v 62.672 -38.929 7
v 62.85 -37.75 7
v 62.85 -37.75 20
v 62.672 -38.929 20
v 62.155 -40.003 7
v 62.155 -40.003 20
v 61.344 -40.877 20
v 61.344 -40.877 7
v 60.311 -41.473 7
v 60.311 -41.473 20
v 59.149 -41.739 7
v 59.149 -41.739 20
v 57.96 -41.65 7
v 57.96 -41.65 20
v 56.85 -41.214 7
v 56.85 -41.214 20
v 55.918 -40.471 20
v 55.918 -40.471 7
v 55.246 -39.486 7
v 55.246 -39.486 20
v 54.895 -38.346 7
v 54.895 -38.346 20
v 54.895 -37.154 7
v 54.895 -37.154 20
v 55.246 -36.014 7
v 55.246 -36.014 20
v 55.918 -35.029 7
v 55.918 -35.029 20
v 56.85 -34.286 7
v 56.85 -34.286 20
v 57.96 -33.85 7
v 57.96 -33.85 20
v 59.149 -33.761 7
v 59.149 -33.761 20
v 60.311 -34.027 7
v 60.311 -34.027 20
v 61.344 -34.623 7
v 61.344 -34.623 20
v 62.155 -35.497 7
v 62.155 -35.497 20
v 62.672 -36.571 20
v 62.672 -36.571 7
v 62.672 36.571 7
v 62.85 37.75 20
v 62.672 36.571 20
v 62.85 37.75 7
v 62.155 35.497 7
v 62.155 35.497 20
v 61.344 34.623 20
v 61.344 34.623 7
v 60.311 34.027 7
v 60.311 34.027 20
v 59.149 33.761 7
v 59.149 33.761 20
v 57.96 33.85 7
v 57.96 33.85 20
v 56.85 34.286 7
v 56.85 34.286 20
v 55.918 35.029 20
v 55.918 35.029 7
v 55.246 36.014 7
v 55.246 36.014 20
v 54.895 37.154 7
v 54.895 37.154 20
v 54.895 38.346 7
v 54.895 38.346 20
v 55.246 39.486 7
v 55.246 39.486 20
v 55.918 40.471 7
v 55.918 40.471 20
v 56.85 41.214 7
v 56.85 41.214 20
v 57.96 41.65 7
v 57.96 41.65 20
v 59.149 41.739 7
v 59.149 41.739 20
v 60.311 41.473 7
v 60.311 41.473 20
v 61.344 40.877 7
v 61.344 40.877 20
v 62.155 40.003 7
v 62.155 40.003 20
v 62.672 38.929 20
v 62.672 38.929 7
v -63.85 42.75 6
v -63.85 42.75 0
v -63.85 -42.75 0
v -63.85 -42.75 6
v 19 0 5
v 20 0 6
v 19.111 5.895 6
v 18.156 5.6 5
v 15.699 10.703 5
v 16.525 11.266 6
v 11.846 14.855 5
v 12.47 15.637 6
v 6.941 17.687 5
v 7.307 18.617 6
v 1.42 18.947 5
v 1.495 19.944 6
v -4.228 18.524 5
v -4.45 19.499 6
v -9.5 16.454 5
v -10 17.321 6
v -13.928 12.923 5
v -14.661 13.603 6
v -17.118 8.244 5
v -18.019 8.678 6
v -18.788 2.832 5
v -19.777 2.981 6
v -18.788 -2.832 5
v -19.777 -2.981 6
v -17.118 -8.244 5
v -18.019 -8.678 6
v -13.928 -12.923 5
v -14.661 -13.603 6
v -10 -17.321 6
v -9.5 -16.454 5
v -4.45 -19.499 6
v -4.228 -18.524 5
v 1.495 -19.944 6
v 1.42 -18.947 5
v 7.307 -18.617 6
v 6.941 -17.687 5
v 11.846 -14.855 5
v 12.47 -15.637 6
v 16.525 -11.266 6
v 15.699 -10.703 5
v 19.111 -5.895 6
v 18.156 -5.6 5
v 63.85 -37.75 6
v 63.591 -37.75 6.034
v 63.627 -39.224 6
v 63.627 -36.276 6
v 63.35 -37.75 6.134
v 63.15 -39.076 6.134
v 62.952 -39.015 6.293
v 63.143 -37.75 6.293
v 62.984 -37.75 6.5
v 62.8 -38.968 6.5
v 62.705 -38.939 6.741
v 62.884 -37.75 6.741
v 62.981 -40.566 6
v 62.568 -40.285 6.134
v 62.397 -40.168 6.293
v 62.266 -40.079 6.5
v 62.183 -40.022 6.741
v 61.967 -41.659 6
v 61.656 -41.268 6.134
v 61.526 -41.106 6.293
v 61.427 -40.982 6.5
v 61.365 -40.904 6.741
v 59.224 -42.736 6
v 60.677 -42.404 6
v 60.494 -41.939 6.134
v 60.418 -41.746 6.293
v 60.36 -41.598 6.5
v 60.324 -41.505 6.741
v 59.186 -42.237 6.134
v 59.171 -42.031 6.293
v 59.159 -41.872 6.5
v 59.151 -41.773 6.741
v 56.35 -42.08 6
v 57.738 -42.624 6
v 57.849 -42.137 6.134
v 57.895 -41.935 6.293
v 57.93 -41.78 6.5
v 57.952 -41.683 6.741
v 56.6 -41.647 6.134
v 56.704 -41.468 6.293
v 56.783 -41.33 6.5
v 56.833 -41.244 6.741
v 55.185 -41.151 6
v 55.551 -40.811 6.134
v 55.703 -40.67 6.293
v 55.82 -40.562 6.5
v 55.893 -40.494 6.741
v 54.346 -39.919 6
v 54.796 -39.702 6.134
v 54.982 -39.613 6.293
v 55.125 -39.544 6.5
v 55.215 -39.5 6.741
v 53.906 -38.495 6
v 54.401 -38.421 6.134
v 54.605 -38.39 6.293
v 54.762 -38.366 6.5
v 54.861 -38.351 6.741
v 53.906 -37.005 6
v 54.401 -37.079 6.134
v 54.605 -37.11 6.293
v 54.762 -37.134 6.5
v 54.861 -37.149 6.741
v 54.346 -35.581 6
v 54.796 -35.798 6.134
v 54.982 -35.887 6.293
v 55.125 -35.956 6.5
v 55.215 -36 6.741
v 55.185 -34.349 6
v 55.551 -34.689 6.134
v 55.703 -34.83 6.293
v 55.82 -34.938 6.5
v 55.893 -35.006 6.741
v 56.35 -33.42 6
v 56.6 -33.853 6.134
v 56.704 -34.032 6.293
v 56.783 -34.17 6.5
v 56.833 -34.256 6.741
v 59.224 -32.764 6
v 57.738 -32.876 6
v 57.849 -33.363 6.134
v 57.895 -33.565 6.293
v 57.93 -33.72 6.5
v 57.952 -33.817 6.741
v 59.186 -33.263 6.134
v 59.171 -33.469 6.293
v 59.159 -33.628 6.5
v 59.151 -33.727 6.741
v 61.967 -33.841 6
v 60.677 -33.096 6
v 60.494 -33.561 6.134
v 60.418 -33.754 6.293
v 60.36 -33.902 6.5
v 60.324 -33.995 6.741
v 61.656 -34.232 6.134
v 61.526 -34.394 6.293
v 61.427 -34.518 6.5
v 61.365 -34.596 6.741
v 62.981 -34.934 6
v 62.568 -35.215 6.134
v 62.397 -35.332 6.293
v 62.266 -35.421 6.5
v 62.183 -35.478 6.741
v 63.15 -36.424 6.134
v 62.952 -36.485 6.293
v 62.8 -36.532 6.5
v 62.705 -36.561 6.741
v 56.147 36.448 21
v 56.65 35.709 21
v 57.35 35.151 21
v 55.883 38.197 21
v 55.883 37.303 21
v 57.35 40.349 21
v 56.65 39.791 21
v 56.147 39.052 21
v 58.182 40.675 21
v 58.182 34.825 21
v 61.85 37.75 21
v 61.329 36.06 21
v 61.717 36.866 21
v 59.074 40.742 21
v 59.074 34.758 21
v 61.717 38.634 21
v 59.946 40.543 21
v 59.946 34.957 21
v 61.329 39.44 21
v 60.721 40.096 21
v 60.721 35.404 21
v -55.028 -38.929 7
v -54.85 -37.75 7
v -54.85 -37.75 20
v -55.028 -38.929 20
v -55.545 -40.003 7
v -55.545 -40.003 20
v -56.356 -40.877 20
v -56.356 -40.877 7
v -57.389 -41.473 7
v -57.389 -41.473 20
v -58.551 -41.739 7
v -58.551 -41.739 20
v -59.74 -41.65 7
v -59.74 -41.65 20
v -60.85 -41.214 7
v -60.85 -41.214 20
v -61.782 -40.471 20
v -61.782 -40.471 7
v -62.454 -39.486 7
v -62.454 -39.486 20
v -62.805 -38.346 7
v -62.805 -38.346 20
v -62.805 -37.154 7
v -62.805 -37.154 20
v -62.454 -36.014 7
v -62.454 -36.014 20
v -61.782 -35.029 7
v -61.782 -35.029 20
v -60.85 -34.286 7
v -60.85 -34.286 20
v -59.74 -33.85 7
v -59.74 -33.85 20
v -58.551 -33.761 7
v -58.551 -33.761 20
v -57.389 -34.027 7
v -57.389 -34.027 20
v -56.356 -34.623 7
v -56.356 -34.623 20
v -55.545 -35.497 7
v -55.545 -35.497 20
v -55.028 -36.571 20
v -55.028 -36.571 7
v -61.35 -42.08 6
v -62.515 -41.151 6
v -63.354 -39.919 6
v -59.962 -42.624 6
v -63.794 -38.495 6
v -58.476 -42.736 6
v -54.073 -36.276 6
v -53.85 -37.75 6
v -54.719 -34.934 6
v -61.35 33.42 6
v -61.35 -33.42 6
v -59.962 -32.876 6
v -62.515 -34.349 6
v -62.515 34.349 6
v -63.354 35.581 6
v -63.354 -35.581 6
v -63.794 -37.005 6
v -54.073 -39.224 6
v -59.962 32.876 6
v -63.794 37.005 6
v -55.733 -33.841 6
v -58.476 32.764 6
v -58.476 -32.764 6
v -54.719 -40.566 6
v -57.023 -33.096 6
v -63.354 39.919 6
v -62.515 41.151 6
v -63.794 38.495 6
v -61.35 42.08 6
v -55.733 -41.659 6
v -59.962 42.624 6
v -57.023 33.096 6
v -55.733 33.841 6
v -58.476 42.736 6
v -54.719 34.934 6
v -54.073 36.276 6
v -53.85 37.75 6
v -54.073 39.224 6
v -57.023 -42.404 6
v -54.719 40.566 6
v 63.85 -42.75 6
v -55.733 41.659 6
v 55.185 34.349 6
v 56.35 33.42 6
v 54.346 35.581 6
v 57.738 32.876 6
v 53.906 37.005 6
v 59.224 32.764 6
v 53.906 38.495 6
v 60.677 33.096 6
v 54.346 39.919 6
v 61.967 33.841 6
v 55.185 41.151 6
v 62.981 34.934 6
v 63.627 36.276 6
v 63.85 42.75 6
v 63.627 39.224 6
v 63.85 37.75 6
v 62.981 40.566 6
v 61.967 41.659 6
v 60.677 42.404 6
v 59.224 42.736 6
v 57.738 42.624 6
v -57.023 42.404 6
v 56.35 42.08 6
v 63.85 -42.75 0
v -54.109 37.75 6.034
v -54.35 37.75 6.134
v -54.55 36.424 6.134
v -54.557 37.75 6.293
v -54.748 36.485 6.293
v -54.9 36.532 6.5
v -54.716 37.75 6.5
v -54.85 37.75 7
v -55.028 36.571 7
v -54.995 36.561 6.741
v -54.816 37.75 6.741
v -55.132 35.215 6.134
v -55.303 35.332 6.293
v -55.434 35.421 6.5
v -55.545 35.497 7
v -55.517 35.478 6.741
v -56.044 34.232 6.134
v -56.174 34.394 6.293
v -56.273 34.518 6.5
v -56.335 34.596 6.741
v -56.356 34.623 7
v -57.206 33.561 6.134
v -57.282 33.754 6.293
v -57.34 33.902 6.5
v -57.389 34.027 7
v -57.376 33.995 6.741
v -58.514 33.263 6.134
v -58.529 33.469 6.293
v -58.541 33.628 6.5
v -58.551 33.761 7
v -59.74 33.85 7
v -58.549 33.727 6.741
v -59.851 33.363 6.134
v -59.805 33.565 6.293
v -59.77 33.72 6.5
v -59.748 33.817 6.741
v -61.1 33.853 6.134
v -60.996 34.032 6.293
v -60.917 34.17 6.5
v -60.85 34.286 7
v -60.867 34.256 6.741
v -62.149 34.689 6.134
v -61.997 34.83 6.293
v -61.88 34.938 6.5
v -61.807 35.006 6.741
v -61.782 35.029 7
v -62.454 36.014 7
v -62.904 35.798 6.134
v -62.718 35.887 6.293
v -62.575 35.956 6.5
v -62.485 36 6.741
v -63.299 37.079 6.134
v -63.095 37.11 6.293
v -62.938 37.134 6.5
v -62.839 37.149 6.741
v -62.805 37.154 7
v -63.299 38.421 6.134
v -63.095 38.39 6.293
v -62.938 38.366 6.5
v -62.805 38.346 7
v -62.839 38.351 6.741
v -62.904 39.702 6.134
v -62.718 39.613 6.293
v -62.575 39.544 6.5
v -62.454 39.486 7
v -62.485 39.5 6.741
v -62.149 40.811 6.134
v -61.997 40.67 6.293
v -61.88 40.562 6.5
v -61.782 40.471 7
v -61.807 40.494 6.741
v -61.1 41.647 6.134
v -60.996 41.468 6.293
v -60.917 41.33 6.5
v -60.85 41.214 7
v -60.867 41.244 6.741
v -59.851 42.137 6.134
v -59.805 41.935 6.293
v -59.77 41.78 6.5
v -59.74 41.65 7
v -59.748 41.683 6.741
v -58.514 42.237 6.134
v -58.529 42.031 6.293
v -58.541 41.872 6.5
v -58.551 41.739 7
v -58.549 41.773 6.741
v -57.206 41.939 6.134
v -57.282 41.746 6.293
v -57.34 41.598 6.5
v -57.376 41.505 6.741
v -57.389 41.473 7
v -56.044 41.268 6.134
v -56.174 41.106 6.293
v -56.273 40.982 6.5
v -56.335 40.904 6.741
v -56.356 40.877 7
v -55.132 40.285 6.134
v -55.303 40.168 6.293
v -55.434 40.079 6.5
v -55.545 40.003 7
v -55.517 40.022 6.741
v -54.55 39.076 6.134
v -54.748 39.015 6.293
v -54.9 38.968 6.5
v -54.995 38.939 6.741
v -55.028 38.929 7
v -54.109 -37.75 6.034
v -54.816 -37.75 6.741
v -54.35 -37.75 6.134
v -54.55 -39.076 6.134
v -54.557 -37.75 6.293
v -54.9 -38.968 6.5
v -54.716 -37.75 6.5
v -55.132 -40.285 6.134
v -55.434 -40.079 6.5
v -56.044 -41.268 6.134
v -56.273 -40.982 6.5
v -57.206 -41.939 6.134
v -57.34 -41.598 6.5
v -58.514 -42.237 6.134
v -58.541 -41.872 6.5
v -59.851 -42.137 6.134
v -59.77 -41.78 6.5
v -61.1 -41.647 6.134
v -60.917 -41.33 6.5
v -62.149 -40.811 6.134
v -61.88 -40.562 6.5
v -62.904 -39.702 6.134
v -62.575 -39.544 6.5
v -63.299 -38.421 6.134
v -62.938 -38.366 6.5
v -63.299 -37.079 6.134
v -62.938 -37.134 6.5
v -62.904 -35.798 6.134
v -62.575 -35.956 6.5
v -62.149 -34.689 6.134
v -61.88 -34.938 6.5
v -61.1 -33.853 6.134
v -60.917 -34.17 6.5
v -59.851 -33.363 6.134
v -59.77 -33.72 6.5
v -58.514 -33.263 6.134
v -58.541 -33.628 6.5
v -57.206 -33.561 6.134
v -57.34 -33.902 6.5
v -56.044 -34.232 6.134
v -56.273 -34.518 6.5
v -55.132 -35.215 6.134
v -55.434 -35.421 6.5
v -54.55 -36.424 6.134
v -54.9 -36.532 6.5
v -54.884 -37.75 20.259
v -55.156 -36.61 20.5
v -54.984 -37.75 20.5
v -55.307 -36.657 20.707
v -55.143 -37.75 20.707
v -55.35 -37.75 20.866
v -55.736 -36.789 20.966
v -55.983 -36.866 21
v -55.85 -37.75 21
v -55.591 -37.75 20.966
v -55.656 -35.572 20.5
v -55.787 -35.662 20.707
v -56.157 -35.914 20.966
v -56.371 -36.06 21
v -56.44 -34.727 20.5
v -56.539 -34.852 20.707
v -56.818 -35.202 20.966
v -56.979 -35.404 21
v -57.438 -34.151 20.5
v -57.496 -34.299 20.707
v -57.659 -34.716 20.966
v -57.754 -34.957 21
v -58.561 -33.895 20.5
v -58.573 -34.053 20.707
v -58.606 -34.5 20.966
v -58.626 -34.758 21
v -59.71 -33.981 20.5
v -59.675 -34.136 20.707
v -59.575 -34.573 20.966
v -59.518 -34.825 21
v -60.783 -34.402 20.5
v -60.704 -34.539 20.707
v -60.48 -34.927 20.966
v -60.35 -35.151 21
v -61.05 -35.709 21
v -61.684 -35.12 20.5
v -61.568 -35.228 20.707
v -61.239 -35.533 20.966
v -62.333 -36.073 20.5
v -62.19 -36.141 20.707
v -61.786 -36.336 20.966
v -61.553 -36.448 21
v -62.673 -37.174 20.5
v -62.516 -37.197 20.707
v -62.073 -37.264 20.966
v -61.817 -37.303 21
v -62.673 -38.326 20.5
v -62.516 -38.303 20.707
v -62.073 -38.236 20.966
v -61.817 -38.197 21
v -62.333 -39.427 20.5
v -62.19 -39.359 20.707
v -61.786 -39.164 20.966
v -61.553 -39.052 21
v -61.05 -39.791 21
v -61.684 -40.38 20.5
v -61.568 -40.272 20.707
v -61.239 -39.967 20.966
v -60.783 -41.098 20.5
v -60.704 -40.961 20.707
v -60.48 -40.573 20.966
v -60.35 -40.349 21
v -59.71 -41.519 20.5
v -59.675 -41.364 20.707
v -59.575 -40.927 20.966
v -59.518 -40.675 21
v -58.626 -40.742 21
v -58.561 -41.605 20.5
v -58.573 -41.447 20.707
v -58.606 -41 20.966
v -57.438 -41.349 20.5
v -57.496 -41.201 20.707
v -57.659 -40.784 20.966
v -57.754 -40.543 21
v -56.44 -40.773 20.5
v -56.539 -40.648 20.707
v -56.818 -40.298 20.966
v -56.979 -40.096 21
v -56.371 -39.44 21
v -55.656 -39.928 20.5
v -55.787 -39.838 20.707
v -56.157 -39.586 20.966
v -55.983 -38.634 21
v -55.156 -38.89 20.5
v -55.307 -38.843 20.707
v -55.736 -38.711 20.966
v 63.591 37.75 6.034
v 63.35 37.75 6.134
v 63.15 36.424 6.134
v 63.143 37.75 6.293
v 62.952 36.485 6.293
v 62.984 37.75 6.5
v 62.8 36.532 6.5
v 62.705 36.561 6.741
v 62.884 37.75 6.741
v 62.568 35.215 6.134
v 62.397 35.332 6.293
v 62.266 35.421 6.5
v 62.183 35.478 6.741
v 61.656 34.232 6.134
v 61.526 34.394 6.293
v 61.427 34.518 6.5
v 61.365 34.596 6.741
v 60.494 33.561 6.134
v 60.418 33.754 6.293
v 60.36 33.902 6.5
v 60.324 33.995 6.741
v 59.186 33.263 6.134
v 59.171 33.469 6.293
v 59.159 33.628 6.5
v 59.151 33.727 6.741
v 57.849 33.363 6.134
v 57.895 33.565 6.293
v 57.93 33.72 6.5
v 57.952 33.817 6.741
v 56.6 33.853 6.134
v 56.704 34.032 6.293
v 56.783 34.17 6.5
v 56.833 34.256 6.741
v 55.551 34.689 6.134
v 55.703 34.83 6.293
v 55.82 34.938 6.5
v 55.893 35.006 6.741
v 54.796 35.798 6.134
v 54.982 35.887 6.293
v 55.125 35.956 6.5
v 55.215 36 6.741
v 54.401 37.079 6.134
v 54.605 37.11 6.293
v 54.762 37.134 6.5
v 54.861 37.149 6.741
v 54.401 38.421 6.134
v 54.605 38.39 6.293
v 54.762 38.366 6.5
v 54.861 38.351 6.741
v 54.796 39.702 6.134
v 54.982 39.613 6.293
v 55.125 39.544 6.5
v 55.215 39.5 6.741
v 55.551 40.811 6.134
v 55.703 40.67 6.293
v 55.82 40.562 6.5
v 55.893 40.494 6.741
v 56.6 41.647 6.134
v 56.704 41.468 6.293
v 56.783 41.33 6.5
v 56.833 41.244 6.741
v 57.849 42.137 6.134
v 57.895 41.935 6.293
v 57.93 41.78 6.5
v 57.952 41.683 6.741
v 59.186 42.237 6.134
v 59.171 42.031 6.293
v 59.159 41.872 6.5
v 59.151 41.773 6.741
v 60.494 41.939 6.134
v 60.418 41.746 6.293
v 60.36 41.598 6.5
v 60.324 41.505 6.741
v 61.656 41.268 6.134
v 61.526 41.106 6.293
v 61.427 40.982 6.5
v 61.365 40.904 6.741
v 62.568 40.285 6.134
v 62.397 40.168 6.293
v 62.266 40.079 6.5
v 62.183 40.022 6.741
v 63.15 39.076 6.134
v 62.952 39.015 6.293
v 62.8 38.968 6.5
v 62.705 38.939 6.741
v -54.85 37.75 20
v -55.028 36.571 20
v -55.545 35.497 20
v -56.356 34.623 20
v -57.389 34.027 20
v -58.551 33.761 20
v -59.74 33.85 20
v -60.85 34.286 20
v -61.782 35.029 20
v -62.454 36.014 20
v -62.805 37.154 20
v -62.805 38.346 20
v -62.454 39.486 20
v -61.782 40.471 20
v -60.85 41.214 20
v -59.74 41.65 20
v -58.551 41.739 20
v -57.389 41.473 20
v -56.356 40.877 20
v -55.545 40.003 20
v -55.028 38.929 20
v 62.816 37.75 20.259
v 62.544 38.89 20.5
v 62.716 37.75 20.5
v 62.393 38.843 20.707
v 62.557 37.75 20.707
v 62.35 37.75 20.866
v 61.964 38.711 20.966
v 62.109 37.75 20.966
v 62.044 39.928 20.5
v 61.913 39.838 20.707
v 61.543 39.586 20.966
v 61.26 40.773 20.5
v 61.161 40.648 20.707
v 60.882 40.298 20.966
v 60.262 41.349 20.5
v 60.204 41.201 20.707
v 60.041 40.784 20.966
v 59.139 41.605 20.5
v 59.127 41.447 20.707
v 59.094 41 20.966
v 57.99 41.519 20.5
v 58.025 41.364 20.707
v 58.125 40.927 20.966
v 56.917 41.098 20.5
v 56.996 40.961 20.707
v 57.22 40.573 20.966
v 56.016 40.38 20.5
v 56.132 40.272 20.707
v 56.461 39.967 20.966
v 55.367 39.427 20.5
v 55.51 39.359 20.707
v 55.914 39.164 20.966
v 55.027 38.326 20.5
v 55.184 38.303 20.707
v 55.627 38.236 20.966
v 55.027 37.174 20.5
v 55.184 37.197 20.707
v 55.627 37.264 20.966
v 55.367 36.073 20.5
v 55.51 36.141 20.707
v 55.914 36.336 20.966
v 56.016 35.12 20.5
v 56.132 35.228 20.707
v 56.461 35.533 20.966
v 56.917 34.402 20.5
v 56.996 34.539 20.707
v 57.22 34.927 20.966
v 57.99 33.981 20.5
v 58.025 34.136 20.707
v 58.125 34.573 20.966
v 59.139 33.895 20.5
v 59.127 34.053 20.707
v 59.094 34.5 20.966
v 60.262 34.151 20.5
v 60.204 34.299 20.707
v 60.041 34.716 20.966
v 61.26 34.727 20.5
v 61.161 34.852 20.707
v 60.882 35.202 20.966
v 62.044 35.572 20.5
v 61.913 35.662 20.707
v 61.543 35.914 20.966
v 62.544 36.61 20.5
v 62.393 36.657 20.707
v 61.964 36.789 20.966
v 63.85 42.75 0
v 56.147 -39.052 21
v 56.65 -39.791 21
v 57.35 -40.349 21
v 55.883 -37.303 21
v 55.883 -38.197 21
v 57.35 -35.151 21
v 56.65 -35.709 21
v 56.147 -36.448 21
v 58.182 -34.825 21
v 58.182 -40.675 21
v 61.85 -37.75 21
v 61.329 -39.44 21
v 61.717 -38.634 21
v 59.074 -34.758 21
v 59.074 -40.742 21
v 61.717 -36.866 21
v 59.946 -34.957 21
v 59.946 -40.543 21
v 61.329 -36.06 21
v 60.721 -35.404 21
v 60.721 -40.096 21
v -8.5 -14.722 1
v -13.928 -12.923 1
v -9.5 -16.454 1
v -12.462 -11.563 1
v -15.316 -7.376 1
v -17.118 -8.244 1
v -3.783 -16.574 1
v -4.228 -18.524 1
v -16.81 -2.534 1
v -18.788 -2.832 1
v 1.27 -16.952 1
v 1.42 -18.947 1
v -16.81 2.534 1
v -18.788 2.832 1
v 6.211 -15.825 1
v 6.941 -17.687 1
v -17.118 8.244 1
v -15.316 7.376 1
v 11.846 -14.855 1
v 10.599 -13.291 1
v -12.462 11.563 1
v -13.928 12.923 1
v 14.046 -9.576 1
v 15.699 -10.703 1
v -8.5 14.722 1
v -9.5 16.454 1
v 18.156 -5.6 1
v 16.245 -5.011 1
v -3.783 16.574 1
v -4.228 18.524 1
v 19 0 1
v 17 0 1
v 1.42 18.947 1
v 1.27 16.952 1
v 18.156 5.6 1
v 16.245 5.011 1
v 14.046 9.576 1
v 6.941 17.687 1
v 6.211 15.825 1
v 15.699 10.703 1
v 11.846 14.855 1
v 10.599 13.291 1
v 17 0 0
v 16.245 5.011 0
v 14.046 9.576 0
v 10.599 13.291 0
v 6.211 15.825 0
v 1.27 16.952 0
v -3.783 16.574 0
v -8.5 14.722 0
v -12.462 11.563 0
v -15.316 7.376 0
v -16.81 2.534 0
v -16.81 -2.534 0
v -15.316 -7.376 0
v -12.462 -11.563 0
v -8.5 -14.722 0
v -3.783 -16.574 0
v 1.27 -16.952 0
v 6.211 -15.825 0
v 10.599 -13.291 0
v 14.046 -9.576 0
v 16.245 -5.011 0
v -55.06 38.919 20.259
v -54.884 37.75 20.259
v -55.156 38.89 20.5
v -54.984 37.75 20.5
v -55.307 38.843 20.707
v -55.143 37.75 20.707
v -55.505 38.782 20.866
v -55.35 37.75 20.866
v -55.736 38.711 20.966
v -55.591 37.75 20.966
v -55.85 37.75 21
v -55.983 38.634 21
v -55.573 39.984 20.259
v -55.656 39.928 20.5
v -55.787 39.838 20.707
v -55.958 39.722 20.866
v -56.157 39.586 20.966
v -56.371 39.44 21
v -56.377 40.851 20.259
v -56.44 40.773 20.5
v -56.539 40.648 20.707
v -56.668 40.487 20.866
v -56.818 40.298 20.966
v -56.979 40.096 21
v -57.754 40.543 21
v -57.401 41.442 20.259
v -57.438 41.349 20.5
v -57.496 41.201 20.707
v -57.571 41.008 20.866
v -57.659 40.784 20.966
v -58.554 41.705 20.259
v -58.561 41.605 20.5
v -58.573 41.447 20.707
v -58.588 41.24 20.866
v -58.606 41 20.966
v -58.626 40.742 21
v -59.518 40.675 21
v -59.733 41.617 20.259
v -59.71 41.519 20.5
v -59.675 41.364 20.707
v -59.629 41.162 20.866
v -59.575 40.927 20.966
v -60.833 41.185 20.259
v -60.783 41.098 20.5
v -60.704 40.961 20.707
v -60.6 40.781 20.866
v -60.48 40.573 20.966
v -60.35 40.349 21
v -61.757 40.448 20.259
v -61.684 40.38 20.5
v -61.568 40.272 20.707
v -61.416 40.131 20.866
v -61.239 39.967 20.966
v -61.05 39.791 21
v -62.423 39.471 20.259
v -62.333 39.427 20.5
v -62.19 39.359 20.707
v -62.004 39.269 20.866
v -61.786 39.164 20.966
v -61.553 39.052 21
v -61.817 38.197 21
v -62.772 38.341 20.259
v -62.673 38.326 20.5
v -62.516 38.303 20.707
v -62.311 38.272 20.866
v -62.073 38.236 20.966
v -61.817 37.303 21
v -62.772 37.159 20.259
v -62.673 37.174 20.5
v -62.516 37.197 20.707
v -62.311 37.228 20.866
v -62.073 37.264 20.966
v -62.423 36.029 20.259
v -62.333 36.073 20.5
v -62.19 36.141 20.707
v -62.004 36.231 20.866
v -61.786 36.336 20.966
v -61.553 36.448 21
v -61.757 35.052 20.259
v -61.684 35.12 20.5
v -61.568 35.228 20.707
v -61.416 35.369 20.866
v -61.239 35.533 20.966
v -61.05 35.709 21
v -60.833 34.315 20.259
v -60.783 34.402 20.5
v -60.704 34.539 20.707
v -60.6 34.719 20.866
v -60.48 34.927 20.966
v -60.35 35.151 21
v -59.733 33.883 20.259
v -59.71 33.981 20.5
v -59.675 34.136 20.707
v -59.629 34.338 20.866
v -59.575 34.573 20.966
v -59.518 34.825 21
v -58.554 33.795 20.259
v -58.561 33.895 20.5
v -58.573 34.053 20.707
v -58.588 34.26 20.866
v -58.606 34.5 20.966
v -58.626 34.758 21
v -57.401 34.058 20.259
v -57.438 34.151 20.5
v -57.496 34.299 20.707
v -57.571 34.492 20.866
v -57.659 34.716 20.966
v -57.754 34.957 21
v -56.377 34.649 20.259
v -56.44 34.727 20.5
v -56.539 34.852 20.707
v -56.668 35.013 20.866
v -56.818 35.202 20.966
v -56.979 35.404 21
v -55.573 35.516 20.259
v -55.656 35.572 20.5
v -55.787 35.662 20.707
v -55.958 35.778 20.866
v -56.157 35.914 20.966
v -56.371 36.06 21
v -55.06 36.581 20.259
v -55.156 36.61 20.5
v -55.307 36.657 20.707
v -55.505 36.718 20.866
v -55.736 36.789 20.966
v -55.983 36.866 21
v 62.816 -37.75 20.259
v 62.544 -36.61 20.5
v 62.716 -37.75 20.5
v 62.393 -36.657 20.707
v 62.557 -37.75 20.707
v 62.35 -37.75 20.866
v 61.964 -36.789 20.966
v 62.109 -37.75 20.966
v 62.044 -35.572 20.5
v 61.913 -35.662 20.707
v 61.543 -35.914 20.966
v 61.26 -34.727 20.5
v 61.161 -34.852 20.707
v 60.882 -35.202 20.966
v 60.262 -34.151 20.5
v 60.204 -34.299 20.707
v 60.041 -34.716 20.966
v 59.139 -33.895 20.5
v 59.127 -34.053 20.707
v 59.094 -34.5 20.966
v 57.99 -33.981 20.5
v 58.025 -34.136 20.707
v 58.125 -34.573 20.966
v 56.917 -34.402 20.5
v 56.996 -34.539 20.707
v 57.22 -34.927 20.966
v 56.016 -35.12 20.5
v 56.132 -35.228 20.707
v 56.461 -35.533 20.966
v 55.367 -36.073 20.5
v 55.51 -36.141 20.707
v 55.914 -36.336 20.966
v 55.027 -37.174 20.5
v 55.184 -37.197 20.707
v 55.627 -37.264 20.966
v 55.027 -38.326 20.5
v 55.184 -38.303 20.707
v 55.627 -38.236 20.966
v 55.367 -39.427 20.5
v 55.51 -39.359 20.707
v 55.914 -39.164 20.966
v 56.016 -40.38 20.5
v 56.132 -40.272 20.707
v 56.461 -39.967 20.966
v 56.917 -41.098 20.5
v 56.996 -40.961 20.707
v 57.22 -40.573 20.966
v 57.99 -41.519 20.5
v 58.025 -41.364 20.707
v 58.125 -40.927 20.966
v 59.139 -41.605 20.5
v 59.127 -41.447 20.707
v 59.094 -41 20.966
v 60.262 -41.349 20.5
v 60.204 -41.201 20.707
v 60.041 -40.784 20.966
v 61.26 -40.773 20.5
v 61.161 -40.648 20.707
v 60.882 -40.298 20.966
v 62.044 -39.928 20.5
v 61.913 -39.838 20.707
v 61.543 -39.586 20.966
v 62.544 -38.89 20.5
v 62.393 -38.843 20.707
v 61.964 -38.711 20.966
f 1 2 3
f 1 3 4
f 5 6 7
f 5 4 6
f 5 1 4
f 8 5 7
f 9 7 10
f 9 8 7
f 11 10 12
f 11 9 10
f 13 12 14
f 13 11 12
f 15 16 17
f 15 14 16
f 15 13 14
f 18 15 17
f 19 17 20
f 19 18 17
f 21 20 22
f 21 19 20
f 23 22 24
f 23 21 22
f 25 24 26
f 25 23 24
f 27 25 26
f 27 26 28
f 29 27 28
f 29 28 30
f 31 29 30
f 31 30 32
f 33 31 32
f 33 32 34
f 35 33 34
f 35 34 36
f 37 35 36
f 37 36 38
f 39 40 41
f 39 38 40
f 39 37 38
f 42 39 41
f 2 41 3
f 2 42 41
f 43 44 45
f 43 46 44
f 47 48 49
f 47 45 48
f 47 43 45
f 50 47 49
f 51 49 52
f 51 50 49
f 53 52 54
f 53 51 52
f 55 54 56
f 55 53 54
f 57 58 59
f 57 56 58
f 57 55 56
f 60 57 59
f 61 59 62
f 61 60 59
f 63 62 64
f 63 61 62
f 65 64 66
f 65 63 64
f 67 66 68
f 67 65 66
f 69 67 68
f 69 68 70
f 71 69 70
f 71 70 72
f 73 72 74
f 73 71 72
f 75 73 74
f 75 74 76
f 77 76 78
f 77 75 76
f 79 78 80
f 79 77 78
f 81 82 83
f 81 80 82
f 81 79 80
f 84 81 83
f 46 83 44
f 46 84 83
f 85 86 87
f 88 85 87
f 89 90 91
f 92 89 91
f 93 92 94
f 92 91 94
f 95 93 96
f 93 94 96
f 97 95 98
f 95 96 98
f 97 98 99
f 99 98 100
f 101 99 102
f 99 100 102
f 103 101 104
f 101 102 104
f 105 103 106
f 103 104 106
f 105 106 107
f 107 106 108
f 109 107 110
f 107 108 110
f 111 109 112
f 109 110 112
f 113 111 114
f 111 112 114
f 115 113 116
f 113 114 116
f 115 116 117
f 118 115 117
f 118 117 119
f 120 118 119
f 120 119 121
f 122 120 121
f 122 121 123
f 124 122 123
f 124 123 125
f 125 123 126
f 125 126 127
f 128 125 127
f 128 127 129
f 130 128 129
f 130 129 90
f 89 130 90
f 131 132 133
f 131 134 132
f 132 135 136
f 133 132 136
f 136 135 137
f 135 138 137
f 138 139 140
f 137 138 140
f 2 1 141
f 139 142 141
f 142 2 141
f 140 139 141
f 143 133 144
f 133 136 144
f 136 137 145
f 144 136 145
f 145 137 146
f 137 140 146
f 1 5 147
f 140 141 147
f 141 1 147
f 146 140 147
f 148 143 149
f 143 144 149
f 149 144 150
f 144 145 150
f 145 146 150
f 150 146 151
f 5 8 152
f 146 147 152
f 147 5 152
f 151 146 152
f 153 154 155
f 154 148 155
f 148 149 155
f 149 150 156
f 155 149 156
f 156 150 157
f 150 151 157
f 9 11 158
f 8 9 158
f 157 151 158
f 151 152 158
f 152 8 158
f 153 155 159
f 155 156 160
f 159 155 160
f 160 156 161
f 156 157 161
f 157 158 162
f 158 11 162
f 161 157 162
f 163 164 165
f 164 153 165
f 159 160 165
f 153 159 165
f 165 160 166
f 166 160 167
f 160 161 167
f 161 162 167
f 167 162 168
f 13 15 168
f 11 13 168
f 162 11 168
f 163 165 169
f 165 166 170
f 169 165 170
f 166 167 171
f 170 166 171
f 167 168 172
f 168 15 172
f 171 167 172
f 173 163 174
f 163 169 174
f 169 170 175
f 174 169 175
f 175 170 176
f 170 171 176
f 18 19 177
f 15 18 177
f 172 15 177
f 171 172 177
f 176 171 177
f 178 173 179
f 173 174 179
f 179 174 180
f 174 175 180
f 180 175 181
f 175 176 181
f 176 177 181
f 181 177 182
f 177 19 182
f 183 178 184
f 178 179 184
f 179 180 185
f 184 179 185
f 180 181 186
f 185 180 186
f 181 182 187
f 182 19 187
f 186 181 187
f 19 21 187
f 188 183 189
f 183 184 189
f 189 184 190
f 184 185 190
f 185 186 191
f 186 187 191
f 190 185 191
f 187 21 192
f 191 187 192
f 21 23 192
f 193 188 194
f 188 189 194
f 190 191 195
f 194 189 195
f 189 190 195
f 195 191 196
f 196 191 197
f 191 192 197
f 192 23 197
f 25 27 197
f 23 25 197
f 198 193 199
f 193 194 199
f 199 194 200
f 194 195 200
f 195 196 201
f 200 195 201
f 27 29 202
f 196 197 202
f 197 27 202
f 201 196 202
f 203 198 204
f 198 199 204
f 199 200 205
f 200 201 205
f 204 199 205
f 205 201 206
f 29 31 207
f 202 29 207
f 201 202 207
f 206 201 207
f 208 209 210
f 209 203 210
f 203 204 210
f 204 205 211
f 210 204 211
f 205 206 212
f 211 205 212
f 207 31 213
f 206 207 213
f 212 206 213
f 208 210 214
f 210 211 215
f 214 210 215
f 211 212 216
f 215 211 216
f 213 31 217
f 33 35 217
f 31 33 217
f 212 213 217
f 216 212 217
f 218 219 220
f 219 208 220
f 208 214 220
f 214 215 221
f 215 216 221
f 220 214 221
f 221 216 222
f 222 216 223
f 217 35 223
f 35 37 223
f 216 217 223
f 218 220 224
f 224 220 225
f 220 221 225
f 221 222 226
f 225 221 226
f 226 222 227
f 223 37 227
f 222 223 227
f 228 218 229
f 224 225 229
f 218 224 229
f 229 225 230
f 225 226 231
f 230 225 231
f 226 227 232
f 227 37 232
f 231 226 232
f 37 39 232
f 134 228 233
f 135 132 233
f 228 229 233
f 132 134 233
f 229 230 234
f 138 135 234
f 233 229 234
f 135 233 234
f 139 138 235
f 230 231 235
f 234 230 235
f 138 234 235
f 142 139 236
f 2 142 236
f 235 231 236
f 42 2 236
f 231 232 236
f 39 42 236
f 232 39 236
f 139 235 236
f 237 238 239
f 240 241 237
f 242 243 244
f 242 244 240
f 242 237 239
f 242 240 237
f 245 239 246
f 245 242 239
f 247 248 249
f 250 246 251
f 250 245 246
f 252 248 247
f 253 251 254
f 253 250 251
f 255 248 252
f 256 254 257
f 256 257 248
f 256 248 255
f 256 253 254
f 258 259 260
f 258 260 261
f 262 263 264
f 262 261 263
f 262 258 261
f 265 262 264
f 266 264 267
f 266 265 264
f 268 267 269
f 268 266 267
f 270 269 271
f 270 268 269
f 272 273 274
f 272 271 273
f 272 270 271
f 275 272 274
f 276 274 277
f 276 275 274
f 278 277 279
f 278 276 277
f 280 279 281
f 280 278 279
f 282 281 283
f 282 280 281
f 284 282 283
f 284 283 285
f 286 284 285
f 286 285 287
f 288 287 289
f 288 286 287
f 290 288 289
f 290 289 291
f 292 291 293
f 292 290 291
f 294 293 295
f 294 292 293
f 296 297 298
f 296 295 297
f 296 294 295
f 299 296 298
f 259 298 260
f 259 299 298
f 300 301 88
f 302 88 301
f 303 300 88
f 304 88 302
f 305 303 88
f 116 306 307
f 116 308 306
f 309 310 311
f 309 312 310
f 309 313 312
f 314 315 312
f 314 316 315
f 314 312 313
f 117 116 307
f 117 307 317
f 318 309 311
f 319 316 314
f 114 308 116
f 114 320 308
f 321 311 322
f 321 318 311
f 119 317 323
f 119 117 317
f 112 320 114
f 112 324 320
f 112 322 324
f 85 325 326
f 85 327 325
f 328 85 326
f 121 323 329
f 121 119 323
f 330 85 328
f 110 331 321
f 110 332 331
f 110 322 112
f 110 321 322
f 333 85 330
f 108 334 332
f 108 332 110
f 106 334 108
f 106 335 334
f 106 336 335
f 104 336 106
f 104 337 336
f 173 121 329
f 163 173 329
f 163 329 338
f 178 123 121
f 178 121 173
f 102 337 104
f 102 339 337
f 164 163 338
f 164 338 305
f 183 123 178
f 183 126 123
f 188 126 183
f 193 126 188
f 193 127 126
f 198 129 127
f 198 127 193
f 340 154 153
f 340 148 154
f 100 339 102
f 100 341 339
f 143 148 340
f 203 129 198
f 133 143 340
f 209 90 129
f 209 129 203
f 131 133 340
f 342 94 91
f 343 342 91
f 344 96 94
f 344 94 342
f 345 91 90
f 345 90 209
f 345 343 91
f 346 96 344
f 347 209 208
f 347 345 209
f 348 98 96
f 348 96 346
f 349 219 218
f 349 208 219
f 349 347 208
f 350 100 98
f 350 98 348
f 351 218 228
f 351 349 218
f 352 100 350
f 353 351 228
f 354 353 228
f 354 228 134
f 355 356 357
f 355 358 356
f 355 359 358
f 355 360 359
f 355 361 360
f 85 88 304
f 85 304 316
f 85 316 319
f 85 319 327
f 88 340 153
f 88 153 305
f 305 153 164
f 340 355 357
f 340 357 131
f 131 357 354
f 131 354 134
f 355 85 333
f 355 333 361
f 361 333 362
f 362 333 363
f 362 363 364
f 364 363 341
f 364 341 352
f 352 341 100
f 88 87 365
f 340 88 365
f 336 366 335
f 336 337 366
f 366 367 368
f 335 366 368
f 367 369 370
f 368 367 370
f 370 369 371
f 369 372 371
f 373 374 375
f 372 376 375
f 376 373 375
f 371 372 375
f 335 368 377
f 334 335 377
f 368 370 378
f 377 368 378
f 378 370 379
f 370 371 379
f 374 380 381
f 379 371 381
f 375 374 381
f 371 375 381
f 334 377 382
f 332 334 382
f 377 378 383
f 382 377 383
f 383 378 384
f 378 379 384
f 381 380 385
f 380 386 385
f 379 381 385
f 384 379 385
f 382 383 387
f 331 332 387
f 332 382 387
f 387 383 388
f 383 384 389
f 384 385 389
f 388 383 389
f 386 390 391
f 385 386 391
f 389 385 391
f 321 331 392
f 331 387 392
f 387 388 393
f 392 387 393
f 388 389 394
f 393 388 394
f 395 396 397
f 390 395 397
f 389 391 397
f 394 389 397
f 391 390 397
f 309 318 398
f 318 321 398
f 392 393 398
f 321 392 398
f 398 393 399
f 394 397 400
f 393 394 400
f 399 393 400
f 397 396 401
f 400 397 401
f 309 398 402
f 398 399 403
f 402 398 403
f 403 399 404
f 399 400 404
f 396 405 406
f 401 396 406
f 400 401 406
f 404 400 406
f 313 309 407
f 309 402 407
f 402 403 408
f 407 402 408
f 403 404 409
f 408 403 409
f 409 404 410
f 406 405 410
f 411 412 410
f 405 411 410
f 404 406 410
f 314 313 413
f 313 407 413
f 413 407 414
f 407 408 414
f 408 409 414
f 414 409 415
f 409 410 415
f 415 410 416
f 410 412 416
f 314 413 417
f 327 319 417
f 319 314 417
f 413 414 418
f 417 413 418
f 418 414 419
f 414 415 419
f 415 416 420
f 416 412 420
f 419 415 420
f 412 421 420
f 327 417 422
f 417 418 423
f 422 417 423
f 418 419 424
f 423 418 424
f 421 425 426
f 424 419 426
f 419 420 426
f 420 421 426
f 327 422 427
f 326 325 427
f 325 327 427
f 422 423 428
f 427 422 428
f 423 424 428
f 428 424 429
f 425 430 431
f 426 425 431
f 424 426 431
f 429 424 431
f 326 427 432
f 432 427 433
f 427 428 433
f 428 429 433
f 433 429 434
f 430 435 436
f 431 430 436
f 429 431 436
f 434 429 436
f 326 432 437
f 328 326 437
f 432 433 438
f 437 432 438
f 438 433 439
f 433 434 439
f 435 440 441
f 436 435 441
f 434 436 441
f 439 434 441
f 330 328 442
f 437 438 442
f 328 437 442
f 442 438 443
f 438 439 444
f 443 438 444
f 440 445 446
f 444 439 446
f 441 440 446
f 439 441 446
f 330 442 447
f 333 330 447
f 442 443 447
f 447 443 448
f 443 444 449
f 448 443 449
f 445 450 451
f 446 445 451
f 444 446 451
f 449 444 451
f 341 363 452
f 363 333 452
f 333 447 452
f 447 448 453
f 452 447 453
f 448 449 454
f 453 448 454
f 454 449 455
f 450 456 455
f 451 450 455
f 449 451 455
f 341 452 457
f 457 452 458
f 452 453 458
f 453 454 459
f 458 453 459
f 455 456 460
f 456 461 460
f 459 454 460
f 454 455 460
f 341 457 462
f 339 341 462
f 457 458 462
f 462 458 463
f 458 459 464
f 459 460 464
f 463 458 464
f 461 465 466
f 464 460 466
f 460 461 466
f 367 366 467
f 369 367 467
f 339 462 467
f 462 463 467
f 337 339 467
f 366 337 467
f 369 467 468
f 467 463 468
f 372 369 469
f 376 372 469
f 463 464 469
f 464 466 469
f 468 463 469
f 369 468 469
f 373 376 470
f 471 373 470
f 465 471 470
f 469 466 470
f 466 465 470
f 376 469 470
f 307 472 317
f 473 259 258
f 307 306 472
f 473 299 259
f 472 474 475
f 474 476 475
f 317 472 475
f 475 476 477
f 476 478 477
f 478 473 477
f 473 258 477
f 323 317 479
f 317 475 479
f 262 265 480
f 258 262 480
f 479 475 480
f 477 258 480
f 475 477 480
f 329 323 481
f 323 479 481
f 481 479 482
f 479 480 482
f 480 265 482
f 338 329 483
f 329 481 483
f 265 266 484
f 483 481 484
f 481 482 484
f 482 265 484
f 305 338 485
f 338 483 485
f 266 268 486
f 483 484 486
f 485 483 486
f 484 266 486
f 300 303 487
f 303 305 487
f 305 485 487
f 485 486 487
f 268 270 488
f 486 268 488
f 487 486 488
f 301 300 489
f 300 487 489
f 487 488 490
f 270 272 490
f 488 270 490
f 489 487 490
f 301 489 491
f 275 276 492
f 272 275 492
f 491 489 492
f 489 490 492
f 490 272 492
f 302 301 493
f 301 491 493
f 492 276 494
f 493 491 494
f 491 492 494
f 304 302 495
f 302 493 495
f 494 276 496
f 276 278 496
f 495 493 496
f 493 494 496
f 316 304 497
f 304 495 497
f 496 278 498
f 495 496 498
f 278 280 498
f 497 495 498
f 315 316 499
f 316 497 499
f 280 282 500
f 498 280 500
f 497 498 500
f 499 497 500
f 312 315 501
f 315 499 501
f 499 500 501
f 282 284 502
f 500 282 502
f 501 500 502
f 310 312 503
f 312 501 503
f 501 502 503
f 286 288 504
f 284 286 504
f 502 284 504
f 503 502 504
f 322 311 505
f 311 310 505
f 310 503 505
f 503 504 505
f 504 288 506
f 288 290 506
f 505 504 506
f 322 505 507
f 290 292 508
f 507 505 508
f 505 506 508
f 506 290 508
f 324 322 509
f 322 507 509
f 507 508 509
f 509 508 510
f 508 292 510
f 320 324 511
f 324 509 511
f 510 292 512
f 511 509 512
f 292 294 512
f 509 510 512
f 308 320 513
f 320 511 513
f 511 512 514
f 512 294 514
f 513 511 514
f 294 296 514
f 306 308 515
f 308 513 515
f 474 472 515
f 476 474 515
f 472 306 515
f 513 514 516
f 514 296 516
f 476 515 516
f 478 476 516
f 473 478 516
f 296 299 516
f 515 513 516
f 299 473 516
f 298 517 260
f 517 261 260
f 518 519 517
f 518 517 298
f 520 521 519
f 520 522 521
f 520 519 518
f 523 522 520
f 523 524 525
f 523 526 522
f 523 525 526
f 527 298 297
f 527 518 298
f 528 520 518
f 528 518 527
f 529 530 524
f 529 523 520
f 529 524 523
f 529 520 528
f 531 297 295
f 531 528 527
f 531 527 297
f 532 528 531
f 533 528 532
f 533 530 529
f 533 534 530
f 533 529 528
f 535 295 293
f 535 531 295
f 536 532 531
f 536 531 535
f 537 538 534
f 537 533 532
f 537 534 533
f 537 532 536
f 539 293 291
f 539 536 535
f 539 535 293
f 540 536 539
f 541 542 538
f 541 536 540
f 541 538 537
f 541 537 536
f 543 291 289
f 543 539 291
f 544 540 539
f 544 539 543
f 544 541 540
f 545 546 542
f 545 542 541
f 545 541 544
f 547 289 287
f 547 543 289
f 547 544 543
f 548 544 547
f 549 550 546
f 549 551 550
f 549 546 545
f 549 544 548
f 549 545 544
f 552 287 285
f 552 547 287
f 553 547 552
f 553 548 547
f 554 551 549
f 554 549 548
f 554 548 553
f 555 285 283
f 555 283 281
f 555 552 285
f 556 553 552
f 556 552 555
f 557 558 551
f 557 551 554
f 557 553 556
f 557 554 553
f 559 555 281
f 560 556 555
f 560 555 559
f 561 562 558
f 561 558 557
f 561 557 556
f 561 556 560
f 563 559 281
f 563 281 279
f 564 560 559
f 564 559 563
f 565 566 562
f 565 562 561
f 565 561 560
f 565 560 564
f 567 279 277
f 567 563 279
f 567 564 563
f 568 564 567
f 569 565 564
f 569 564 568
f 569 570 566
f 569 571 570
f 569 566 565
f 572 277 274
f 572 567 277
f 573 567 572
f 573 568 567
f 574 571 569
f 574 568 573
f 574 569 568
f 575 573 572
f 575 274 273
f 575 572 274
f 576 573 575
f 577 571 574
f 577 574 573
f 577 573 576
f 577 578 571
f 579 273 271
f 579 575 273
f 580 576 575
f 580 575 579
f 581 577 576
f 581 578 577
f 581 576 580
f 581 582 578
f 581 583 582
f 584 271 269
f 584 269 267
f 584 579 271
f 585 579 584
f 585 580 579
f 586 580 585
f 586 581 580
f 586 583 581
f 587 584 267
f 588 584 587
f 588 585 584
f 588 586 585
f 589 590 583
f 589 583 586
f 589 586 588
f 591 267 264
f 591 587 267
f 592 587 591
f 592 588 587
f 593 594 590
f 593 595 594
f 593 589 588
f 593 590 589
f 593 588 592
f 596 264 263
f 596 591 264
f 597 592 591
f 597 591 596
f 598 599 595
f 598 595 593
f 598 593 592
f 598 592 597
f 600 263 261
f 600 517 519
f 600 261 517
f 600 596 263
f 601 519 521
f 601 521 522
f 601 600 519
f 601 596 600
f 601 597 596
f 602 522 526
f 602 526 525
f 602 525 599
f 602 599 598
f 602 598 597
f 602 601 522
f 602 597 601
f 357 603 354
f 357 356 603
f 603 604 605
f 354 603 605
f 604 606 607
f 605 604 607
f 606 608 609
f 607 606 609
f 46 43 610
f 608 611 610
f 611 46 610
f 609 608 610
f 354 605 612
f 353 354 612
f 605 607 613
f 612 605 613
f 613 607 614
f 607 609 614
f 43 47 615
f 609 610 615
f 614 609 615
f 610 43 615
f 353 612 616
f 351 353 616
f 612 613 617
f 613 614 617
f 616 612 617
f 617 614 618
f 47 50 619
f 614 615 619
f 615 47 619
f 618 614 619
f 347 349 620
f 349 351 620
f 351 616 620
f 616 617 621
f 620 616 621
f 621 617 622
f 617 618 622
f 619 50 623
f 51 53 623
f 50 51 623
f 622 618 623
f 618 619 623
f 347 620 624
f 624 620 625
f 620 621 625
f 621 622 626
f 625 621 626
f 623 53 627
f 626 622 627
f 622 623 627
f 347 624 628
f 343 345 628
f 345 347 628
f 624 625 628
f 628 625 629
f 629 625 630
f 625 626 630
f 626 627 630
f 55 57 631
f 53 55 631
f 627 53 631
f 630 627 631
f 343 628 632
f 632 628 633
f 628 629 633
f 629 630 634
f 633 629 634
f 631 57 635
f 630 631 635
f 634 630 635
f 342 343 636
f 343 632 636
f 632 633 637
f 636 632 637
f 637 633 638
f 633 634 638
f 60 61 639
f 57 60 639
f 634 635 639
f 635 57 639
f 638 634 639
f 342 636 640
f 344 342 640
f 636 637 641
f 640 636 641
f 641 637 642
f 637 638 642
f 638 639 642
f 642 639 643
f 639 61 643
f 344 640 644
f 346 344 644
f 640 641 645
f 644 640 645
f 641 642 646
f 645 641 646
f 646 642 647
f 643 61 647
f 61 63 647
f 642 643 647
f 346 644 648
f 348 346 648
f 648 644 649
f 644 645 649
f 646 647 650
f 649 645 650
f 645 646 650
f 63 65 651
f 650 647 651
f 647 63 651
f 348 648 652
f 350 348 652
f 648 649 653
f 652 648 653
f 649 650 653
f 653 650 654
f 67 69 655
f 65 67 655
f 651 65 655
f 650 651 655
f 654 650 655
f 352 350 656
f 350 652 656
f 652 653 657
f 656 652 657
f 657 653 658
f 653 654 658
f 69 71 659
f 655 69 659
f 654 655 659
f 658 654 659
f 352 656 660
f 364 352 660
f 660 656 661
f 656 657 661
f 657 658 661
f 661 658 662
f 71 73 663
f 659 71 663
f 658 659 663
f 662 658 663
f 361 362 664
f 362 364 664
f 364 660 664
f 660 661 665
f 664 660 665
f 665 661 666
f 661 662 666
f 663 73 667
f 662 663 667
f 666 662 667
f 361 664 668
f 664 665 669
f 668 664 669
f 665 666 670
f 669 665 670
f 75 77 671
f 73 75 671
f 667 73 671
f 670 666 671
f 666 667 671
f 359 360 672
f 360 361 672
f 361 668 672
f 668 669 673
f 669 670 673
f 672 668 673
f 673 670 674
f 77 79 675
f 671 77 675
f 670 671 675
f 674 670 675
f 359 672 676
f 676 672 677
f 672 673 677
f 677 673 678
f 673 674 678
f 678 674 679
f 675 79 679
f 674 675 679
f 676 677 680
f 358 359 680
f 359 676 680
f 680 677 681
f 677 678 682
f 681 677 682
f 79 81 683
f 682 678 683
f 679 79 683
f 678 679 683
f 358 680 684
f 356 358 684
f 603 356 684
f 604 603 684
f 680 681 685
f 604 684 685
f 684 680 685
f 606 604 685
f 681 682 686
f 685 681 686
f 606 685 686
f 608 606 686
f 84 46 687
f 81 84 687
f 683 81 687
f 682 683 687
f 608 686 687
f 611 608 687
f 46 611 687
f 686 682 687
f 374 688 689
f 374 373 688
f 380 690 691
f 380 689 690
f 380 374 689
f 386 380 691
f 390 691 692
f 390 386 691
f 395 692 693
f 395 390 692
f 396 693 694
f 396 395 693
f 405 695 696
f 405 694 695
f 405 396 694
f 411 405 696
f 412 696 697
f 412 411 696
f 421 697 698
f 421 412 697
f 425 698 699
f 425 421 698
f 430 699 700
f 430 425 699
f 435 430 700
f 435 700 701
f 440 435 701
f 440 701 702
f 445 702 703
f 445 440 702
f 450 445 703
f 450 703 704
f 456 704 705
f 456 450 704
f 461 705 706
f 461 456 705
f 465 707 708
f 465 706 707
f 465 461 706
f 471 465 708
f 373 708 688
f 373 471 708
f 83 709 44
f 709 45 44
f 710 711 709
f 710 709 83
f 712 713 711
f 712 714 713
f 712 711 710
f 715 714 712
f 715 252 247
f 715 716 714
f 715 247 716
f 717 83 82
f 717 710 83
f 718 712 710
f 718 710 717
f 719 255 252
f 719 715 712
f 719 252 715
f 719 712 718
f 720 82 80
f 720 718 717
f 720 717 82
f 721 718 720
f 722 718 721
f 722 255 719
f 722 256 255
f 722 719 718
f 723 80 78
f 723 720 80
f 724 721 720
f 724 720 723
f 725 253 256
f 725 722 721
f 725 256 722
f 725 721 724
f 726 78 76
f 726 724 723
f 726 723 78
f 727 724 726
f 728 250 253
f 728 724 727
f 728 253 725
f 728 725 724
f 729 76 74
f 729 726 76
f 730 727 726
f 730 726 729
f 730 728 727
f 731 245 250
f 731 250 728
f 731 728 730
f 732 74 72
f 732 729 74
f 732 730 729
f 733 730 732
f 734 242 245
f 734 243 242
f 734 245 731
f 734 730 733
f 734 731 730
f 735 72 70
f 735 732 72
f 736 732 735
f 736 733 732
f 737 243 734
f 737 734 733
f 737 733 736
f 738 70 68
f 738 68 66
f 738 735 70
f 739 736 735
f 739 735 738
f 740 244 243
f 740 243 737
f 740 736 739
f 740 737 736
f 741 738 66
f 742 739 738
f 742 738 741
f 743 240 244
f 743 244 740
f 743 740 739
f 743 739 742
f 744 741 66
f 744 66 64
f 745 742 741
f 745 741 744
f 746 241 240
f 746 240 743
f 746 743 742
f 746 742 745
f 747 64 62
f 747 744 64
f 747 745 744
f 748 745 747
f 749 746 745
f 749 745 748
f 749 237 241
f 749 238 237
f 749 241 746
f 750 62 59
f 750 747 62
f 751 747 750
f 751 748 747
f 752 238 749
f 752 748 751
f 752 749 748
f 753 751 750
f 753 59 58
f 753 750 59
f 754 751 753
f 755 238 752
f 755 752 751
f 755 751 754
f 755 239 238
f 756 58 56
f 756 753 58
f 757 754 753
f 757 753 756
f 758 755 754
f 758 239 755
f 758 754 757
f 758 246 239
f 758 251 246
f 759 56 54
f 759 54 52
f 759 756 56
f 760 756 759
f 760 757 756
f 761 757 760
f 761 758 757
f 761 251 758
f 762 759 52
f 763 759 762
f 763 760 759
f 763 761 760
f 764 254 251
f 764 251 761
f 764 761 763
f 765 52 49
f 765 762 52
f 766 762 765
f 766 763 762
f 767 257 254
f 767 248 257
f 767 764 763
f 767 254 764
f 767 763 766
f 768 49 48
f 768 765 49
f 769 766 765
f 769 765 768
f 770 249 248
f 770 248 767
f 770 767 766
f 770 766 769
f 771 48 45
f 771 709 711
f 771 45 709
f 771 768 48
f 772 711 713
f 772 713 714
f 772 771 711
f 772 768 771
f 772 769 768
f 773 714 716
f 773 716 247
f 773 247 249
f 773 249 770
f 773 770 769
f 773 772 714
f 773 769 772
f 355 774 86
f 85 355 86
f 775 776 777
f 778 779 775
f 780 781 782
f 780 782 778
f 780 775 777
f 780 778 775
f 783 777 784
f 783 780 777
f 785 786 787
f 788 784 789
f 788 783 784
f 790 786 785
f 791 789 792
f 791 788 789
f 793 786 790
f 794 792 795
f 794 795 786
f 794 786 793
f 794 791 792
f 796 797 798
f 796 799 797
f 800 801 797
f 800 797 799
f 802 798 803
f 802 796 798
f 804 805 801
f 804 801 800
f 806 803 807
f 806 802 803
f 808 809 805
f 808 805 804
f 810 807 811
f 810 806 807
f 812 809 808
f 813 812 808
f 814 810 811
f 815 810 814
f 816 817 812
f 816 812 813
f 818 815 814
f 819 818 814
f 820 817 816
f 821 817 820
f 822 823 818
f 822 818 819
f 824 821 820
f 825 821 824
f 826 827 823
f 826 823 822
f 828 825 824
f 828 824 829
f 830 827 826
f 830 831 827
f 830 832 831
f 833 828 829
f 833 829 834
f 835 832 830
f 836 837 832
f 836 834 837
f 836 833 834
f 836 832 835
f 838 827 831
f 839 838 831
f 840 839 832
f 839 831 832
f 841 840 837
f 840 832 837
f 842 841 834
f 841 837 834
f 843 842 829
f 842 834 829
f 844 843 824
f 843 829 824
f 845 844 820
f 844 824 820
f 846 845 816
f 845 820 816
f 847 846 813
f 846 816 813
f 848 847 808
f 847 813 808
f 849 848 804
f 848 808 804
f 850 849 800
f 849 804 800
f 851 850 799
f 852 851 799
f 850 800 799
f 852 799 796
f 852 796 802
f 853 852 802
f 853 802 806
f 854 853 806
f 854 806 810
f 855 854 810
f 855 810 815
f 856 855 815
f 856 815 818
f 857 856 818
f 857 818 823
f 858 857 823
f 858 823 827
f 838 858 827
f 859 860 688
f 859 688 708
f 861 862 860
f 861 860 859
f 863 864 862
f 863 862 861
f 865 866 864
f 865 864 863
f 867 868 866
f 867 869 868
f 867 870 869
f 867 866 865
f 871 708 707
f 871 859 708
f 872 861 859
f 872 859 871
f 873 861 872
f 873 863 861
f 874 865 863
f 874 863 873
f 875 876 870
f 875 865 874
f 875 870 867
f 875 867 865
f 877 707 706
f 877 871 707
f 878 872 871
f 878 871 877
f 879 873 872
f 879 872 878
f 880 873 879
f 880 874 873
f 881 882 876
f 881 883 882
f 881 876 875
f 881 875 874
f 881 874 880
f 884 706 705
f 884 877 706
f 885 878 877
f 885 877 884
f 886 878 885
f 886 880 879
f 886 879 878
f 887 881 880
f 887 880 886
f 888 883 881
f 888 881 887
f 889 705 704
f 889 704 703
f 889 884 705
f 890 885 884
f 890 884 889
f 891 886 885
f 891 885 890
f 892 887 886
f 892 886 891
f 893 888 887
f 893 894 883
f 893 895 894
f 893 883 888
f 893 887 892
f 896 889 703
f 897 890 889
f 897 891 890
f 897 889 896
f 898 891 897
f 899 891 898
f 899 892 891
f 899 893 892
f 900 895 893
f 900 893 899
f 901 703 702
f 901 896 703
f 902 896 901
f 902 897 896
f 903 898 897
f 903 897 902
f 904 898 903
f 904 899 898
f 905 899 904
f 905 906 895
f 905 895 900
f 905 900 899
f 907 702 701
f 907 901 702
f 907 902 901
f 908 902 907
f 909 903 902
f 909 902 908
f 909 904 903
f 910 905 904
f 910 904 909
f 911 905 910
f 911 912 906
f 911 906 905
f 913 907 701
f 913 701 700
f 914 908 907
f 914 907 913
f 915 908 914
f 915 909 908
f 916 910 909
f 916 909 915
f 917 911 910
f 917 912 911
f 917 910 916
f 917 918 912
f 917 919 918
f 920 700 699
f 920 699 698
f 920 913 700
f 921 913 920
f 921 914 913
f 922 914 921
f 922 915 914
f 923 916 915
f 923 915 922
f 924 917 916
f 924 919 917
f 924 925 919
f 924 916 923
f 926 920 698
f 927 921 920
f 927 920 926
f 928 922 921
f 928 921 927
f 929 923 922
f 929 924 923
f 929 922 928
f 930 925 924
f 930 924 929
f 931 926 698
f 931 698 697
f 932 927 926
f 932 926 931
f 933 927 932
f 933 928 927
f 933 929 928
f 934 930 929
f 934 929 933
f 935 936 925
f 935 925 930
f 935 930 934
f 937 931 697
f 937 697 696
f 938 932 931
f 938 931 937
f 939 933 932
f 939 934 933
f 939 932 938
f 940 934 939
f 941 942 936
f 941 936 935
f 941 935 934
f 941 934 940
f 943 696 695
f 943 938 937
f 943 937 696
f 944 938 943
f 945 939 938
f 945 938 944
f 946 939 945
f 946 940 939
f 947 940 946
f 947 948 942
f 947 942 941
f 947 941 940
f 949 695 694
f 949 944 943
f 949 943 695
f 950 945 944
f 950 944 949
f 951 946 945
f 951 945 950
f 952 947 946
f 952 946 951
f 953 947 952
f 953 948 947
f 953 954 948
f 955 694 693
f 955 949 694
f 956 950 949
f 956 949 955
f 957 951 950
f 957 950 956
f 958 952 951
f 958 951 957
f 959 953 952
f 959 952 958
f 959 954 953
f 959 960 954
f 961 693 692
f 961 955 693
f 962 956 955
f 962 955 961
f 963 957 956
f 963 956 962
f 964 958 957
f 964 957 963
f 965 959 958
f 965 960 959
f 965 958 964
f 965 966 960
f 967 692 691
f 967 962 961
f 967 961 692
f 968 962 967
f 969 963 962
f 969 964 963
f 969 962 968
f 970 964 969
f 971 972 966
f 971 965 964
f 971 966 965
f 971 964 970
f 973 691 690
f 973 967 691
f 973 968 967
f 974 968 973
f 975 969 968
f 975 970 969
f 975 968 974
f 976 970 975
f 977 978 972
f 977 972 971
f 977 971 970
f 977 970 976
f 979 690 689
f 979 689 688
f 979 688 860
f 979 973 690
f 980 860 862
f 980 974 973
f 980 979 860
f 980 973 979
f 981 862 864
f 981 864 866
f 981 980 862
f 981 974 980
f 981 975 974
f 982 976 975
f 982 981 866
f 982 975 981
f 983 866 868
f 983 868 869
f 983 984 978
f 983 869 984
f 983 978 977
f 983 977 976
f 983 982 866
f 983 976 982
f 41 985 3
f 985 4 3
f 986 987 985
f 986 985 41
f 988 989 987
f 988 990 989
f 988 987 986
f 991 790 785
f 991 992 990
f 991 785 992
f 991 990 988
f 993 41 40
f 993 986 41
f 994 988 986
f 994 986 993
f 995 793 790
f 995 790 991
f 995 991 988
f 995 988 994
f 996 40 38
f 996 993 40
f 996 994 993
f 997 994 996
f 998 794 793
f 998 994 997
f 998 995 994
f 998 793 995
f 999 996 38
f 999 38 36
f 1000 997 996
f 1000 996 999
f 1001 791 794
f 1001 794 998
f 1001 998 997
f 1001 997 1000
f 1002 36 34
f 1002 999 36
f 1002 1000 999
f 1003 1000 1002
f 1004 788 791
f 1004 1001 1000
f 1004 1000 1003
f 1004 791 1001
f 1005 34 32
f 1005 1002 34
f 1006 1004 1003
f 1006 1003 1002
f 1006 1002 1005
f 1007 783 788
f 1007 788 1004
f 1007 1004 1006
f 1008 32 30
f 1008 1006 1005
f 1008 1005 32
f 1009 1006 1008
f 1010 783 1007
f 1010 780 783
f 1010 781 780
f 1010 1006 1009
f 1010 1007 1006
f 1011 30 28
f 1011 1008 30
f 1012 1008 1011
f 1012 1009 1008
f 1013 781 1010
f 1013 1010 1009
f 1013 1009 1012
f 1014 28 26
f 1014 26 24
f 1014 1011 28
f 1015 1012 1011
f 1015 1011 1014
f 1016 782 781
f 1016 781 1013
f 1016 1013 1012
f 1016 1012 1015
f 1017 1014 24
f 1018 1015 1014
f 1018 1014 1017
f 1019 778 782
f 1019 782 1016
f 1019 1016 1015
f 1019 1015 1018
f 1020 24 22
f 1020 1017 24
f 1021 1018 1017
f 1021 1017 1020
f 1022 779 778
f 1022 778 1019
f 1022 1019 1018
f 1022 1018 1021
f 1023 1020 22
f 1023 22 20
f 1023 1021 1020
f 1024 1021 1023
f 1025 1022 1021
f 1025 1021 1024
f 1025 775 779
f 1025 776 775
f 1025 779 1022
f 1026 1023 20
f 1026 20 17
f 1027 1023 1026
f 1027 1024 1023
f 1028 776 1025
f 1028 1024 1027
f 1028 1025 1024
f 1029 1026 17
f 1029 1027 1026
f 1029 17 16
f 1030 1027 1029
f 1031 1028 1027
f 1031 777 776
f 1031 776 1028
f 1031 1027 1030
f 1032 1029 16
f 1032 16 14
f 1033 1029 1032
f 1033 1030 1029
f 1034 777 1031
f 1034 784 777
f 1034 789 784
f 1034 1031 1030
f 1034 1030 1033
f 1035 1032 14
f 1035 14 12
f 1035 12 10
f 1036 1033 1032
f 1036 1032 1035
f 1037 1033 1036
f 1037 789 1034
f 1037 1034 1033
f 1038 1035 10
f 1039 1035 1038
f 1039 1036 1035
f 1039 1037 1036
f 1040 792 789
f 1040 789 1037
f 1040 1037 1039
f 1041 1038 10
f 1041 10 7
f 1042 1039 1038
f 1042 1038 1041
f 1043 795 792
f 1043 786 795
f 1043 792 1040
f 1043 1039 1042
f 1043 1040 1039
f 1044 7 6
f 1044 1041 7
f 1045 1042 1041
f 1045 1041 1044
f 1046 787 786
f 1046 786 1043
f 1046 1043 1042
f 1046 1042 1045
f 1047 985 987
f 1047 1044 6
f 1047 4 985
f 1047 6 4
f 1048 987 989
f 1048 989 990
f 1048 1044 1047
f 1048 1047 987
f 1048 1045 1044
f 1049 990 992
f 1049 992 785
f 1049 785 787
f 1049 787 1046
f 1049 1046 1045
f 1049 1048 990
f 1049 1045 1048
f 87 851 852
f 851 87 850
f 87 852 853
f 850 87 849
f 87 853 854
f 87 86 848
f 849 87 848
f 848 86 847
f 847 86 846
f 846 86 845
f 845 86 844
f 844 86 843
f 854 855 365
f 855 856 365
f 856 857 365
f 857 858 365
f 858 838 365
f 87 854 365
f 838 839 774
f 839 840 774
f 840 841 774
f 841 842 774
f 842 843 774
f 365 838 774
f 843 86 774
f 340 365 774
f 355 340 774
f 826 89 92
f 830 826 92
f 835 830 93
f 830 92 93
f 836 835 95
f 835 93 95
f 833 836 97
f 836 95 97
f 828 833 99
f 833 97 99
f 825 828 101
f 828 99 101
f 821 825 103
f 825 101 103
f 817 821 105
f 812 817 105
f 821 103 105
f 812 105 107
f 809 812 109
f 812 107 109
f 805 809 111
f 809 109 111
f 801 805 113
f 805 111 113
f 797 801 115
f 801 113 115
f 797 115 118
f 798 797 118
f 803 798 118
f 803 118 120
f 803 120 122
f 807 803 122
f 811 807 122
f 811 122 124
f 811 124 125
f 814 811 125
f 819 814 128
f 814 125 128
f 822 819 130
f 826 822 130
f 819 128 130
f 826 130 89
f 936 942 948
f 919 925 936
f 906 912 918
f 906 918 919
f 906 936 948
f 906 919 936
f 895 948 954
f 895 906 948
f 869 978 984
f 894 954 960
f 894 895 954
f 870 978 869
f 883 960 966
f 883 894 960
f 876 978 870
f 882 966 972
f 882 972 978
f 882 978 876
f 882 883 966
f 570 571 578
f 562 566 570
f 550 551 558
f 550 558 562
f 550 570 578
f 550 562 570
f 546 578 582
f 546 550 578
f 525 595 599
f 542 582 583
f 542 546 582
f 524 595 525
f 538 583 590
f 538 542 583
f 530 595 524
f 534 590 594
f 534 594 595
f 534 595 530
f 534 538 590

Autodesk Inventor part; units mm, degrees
ref_plane "YZ Plane" through (0, 0, 0) normal (1, 0, 0) x (0, 1, 0)
ref_plane "XZ Plane" through (0, 0, 0) normal (0, 1, 0) x (-1, 0, 0)
ref_plane "XY Plane" through (0, 0, 0) normal (0, 0, 1) x (1, 0, 0)
sketch "Sketch1" plane through (0, 0, 0) normal (0, 0, 1) x (1, 0, 0)
  line L0 (63.85, 42.75) -> (-63.85, 42.75)
  line L1 (-63.85, 42.75) -> (-63.85, -42.75)
  line L2 (-63.85, -42.75) -> (63.85, -42.75)
  line L3 (63.85, -42.75) -> (63.85, 42.75)
  line L4 (63.85, 42.75) -> (-63.85, -42.75) construction
  line L5 (-63.85, 42.75) -> (63.85, -42.75) construction
  point P0 (0, 0)
  dimension "d0" = 85.5
  dimension "d2" = 127.7
extrude "Extrusion1" add sketch "Sketch1" along normal blind 6
sketch "Sketch2" plane through (0, 0, 6) normal (0, 0, 1) x (1, 0, 0)
  circle A0 centre (0, 0) radius 19
  dimension "d5" = 38
extrude "Extrusion2" cut sketch "Sketch2" against normal blind 5
sketch "Sketch3" plane through (0, 0, 1) normal (0, 0, 1) x (1, 0, 0)
  circle A0 centre (0, 0) radius 19 projected
  circle A1 centre (0, 0) radius 17
  dimension "d9" = 34
extrude "Extrusion3" cut sketch "Sketch3" against normal through all contours A1
chamfer "Chamfer1" distance 1 angle 45 1 edges at (-19, 0, 6)
sketch "Sketch4" plane through (0, 0, 6) normal (0, 0, 1) x (1, 0, 0)
  line L0 (63.85, 42.75) -> (-63.85, 42.75) projected
  line L1 (-63.85, 42.75) -> (-63.85, -42.75) projected
  line L2 (-63.85, -42.75) -> (63.85, -42.75) projected
  line L3 (63.85, -42.75) -> (63.85, 42.75) projected
  line L4 (-63.85, 42.75) -> (-58.85, 42.75) construction
  line L5 (-58.85, 42.75) -> (-58.85, 37.75) construction
  circle A0 centre (-58.85, 37.75) radius 4
  line L6 (0, 42.75) -> (0, -42.75) construction
  line L7 (-63.85, 0) -> (63.85, 0) construction
  circle A1 centre (58.85, 37.75) radius 4
  circle A2 centre (-58.85, -37.75) radius 4
  circle A3 centre (58.85, -37.75) radius 4
  dimension "d16" = 5
  dimension "d18" = 8
extrude "Extrusion4" add sketch "Sketch4" along normal blind 15 contours A0 | A1 | A2 | A3
fillet "Fillet1" radius 1 8 edges at (-62.85, 37.75, 6) (-62.85, 37.75, 21) (-62.85, -37.75, 21) (-62.85, -37.75, 6) (54.85, -37.75, 21) (54.85, -37.75, 6) (54.85, 37.75, 6) (54.85, 37.75, 21)
properties part number "37mm_sd_stage_insert"
